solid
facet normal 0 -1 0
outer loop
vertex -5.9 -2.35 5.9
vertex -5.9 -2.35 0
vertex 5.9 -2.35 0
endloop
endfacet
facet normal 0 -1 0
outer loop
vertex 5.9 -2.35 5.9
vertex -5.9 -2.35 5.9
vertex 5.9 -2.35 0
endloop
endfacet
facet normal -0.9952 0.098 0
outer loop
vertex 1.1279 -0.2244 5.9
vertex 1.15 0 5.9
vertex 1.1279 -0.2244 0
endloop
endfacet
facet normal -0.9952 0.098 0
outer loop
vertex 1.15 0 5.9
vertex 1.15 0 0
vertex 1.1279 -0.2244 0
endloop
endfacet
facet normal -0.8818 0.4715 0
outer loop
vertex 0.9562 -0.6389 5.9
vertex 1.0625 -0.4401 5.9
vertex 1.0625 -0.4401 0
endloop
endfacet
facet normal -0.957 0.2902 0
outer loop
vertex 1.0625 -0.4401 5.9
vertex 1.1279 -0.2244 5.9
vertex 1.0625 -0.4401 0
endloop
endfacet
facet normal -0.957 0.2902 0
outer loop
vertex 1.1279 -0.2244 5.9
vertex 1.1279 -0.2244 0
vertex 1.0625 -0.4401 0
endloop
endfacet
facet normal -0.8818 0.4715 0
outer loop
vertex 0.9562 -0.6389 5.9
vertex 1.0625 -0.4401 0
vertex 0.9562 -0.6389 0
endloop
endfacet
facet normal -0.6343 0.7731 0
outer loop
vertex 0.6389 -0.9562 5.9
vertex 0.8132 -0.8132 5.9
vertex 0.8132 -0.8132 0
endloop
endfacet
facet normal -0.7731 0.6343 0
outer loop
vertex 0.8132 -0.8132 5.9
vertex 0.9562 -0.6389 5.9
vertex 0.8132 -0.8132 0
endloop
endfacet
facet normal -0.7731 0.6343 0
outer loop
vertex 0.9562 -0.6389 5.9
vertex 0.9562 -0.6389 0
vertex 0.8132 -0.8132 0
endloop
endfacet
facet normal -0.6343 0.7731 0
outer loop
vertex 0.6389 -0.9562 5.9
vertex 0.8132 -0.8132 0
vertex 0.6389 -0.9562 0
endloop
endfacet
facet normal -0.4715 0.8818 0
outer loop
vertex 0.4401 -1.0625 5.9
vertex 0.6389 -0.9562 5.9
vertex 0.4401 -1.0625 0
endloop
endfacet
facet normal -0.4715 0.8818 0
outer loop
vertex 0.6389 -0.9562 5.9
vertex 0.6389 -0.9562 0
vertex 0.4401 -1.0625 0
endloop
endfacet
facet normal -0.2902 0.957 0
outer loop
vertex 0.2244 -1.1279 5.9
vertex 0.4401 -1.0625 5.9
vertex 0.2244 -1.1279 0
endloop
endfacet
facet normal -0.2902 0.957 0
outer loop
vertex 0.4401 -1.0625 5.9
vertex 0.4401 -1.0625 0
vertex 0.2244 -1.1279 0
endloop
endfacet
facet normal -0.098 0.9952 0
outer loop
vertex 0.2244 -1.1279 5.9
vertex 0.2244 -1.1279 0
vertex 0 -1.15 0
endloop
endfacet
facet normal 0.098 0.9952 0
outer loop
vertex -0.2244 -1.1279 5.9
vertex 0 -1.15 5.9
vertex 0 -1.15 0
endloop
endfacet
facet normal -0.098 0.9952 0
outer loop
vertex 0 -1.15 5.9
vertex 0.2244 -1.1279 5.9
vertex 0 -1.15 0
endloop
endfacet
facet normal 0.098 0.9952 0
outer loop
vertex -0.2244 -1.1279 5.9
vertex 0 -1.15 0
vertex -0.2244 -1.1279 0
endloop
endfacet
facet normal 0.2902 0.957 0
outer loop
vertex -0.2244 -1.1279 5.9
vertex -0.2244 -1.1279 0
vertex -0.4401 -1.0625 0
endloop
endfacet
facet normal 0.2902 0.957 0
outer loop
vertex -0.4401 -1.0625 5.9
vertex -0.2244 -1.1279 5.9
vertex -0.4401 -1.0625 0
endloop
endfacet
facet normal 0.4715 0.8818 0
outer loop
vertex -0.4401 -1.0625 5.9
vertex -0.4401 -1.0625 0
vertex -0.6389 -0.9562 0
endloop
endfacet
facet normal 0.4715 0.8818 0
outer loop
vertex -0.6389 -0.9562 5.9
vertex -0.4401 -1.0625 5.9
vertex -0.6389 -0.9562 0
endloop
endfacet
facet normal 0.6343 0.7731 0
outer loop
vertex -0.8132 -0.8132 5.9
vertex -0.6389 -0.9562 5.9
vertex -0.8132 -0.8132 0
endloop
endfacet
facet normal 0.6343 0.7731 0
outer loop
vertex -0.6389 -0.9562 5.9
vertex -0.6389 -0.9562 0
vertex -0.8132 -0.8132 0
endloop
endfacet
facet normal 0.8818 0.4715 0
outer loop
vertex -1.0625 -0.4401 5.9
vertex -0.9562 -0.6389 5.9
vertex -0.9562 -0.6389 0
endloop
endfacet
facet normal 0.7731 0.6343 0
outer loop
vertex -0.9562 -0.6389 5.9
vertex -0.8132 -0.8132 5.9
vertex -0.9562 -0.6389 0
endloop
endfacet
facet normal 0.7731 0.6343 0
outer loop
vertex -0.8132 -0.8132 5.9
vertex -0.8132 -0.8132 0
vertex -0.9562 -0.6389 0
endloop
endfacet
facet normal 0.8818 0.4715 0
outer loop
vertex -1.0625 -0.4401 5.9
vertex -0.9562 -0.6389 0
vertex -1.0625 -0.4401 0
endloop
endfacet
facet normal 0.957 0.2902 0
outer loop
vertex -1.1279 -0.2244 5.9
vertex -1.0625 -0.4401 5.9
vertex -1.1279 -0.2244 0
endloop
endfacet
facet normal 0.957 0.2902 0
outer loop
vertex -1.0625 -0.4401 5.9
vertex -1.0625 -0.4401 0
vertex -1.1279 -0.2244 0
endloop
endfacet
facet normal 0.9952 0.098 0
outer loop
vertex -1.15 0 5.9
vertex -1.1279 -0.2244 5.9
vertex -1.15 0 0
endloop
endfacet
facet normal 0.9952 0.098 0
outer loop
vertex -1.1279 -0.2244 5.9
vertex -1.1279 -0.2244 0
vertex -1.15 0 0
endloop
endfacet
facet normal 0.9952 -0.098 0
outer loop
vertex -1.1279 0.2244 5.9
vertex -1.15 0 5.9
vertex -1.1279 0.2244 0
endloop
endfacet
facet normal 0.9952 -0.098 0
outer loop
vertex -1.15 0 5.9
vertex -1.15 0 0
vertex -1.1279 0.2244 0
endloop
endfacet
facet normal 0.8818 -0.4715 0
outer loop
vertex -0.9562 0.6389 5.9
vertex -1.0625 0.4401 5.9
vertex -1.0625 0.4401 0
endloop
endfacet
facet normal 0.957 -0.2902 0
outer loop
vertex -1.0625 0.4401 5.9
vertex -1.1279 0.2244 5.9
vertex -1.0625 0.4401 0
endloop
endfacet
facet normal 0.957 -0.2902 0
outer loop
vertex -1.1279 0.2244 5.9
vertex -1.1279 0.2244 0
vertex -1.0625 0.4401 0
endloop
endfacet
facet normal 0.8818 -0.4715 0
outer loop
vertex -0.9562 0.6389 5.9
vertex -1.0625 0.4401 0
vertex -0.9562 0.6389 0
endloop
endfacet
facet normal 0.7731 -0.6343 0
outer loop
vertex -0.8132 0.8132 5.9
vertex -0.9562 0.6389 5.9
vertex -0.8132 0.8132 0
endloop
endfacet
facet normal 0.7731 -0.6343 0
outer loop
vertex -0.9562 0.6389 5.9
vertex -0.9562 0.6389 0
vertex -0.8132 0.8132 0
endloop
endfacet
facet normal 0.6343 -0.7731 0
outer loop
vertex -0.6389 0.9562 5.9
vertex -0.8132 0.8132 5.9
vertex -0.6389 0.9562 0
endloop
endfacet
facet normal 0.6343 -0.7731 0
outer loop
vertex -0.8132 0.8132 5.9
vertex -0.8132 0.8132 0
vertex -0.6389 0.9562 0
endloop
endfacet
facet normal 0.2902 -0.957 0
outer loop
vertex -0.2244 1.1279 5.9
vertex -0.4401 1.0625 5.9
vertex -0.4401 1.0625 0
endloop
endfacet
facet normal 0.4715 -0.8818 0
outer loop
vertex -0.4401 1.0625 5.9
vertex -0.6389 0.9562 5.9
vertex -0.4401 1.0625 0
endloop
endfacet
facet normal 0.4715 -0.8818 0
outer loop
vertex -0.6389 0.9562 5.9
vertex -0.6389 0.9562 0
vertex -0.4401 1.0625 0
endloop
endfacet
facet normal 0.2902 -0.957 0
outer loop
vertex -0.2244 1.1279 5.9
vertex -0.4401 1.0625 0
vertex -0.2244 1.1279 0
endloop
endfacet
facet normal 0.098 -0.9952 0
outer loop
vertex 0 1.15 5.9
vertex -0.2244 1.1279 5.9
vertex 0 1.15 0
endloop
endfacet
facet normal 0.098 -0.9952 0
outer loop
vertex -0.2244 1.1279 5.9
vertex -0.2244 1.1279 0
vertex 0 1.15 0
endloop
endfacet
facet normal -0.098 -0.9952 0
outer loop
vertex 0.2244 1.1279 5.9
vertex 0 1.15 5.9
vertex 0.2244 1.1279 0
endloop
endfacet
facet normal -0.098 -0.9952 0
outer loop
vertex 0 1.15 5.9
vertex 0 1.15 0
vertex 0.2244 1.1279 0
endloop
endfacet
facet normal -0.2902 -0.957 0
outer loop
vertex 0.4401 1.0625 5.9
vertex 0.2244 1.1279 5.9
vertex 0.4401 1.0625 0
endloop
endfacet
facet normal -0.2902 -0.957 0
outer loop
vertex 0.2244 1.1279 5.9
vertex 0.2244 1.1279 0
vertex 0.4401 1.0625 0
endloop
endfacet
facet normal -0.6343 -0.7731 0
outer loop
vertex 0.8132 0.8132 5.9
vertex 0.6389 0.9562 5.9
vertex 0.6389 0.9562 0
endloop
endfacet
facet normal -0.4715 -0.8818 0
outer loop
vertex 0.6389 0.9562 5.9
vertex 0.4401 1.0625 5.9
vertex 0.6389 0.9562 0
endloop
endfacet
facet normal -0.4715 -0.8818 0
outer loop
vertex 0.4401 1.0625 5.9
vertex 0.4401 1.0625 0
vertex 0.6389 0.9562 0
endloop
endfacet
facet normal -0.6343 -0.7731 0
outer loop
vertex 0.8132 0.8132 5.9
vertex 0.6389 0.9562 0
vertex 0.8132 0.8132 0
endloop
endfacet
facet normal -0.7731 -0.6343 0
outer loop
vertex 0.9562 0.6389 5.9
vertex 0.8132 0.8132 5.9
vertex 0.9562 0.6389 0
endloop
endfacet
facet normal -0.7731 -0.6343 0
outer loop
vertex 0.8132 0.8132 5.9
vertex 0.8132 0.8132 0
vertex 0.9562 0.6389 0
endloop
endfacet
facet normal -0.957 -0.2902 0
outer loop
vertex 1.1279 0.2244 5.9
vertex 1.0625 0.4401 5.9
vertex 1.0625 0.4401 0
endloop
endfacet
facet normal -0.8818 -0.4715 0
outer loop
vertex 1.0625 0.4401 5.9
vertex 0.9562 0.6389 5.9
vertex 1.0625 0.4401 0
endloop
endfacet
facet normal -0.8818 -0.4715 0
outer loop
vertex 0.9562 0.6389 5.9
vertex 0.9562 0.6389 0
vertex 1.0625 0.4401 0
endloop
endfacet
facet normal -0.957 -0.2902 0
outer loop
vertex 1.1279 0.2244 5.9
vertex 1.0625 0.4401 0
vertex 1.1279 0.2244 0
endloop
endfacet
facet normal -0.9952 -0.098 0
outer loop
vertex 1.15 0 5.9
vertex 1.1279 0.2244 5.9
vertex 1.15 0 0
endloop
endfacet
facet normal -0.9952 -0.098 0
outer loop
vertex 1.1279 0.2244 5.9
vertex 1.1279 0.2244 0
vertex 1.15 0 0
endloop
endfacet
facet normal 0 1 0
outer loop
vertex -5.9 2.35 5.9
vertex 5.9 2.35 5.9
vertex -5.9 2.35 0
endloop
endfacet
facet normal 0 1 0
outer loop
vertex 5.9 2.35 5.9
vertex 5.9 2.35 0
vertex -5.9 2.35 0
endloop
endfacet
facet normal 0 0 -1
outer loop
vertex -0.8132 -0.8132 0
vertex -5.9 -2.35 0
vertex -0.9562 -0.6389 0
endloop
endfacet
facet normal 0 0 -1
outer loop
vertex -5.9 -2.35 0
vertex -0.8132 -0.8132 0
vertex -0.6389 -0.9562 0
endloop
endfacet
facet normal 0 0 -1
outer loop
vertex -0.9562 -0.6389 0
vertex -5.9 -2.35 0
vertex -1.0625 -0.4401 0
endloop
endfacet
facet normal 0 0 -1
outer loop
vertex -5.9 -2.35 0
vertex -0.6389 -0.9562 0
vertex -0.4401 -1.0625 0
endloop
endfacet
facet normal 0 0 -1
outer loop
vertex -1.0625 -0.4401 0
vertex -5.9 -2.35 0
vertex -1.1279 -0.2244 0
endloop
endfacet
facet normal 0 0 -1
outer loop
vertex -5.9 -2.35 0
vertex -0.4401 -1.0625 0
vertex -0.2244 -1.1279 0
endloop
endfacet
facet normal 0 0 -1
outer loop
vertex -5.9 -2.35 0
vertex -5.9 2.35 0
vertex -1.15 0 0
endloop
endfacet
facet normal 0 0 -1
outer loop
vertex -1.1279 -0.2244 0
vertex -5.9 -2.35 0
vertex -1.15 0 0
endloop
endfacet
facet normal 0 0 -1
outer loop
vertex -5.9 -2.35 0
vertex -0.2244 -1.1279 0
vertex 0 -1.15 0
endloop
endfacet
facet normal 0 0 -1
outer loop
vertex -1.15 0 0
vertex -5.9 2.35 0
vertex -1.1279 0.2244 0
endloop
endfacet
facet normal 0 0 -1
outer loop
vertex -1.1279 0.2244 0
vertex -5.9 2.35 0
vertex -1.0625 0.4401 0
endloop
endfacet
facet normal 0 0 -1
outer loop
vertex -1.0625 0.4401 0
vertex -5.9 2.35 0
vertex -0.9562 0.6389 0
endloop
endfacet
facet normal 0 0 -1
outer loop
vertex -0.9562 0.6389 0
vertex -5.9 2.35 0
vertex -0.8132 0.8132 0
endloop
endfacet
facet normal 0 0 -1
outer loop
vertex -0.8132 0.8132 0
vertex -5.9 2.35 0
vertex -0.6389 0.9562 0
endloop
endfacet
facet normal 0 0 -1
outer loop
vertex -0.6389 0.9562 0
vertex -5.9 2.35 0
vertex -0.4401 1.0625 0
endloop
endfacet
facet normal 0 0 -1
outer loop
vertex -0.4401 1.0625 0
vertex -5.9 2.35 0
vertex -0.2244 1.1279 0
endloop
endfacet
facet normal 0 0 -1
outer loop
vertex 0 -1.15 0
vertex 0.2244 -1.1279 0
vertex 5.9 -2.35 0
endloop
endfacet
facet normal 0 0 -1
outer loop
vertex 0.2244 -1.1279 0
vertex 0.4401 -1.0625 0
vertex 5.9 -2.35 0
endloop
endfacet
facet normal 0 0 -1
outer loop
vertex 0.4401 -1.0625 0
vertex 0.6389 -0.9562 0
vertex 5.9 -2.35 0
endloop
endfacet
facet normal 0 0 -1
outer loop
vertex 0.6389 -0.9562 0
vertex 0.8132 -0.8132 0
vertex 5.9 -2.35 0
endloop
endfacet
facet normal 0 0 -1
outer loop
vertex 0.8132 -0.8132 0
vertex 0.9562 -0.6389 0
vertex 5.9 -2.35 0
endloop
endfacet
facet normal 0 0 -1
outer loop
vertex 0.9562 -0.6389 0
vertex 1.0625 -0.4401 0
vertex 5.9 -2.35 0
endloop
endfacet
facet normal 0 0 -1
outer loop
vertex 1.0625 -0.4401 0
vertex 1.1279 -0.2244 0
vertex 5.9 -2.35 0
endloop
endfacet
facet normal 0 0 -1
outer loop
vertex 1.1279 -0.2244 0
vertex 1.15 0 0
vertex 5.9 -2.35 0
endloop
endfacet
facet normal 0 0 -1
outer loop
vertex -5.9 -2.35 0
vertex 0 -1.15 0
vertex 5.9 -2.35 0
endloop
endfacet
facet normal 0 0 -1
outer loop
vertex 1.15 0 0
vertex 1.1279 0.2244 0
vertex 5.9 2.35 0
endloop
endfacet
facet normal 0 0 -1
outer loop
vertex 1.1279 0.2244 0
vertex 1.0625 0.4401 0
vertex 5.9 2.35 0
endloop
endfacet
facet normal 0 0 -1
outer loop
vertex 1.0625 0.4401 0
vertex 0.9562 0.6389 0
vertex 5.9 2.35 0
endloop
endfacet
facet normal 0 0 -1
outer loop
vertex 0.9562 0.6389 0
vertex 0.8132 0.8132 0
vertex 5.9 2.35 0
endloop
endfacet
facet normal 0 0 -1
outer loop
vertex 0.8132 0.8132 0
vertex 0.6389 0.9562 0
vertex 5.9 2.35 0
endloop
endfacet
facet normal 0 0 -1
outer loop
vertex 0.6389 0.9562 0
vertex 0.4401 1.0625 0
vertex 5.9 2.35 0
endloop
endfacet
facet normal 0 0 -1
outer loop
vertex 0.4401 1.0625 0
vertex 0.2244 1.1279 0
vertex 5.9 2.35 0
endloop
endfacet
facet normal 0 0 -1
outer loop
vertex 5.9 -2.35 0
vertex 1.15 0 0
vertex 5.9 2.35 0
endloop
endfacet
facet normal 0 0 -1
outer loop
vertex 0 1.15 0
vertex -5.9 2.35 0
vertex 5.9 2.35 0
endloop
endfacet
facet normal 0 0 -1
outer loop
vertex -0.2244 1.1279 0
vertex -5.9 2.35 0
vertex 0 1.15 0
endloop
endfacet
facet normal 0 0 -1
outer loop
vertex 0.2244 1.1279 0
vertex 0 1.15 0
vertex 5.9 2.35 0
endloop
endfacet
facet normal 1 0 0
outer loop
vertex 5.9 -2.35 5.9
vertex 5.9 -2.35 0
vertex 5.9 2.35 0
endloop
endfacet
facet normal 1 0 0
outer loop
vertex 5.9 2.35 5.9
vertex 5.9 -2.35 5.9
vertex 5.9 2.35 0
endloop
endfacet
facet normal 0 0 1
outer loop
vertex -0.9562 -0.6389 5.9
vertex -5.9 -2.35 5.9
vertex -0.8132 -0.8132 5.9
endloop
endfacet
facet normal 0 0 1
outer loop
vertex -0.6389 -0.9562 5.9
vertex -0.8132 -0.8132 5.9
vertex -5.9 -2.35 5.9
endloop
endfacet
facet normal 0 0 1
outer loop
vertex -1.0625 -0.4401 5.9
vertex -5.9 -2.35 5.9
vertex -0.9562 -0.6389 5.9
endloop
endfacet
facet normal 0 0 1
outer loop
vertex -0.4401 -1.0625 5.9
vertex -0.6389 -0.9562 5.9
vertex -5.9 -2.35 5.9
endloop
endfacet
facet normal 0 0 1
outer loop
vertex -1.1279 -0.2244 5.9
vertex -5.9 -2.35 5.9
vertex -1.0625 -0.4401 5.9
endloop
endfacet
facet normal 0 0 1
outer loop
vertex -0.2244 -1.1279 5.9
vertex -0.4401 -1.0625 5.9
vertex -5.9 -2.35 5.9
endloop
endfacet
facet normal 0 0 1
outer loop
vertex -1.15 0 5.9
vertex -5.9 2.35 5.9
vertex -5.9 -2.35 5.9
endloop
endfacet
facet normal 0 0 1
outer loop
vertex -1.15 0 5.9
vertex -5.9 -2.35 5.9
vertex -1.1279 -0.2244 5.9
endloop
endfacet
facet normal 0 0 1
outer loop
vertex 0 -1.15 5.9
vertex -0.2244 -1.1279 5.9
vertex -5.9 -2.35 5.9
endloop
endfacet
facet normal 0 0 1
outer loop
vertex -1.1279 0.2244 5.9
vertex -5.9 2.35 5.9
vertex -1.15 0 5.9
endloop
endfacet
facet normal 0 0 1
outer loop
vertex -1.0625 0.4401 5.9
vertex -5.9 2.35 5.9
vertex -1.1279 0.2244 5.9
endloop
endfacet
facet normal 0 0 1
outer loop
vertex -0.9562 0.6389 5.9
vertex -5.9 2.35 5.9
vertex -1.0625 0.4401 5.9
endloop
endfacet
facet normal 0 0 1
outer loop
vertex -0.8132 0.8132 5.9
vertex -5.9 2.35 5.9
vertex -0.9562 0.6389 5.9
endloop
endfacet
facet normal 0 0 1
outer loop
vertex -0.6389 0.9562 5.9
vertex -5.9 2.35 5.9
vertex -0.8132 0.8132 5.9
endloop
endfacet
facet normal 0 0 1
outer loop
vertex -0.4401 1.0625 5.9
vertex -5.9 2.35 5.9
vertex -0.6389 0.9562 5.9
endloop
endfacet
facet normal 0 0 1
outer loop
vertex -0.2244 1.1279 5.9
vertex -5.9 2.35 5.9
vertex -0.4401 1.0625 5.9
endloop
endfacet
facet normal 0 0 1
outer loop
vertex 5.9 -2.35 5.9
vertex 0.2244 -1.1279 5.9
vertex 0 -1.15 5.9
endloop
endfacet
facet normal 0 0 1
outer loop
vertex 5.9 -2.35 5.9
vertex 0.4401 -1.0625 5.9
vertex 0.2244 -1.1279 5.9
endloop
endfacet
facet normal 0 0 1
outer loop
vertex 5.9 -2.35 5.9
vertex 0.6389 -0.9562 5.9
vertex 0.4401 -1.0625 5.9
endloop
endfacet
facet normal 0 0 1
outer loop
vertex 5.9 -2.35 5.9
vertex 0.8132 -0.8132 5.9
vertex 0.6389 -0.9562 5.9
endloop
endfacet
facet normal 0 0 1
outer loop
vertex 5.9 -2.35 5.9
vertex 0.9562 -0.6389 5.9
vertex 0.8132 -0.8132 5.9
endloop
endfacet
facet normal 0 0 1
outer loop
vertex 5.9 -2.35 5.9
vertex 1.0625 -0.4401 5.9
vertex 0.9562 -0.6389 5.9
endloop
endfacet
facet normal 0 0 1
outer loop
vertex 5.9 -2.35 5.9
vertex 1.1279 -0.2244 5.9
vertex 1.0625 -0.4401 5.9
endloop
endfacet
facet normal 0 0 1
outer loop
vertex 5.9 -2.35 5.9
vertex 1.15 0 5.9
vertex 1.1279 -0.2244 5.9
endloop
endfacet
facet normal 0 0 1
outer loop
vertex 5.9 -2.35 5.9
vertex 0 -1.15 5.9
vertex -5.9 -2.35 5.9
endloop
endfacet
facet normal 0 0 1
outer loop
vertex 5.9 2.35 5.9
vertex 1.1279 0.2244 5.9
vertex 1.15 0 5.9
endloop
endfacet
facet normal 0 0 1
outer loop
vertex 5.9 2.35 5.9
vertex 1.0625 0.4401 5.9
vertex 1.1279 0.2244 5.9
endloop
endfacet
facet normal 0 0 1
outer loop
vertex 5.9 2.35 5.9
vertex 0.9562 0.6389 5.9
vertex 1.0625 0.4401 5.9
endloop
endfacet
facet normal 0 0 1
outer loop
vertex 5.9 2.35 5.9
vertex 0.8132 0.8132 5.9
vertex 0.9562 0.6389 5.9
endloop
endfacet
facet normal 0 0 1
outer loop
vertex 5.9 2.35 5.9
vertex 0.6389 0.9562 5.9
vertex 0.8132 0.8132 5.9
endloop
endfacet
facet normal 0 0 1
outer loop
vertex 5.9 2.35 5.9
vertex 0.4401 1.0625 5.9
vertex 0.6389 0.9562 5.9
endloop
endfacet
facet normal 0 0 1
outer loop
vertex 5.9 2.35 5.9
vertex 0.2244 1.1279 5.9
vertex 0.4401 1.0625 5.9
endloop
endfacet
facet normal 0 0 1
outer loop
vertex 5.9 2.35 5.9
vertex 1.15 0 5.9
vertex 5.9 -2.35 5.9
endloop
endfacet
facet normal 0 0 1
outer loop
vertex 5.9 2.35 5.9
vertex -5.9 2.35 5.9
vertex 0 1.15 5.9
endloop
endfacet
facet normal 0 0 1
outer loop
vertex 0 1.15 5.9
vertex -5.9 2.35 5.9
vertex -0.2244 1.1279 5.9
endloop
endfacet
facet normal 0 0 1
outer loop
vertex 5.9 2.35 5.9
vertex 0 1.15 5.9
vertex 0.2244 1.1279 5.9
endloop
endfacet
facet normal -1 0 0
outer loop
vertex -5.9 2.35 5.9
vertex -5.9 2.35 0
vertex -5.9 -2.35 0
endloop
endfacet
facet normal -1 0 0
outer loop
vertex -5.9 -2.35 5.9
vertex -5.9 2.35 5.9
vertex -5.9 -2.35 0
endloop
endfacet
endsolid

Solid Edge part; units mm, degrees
sketch "Sketch1" plane through (0, 0, 0) normal (0, 0, 1) x (1, 0, 0)
  line L0 (-5.9, -2.35) -> (5.9, -2.35)
  line L1 (5.9, -2.35) -> (5.9, 2.35)
  line L2 (5.9, 2.35) -> (-5.9, 2.35)
  line L3 (-5.9, 2.35) -> (-5.9, -2.35)
  circle A0 centre (0, 0) radius 1.15
extrude "Protrusion1" add sketch "Sketch1" along normal blind 5.9
properties material "Wood, Pine"
